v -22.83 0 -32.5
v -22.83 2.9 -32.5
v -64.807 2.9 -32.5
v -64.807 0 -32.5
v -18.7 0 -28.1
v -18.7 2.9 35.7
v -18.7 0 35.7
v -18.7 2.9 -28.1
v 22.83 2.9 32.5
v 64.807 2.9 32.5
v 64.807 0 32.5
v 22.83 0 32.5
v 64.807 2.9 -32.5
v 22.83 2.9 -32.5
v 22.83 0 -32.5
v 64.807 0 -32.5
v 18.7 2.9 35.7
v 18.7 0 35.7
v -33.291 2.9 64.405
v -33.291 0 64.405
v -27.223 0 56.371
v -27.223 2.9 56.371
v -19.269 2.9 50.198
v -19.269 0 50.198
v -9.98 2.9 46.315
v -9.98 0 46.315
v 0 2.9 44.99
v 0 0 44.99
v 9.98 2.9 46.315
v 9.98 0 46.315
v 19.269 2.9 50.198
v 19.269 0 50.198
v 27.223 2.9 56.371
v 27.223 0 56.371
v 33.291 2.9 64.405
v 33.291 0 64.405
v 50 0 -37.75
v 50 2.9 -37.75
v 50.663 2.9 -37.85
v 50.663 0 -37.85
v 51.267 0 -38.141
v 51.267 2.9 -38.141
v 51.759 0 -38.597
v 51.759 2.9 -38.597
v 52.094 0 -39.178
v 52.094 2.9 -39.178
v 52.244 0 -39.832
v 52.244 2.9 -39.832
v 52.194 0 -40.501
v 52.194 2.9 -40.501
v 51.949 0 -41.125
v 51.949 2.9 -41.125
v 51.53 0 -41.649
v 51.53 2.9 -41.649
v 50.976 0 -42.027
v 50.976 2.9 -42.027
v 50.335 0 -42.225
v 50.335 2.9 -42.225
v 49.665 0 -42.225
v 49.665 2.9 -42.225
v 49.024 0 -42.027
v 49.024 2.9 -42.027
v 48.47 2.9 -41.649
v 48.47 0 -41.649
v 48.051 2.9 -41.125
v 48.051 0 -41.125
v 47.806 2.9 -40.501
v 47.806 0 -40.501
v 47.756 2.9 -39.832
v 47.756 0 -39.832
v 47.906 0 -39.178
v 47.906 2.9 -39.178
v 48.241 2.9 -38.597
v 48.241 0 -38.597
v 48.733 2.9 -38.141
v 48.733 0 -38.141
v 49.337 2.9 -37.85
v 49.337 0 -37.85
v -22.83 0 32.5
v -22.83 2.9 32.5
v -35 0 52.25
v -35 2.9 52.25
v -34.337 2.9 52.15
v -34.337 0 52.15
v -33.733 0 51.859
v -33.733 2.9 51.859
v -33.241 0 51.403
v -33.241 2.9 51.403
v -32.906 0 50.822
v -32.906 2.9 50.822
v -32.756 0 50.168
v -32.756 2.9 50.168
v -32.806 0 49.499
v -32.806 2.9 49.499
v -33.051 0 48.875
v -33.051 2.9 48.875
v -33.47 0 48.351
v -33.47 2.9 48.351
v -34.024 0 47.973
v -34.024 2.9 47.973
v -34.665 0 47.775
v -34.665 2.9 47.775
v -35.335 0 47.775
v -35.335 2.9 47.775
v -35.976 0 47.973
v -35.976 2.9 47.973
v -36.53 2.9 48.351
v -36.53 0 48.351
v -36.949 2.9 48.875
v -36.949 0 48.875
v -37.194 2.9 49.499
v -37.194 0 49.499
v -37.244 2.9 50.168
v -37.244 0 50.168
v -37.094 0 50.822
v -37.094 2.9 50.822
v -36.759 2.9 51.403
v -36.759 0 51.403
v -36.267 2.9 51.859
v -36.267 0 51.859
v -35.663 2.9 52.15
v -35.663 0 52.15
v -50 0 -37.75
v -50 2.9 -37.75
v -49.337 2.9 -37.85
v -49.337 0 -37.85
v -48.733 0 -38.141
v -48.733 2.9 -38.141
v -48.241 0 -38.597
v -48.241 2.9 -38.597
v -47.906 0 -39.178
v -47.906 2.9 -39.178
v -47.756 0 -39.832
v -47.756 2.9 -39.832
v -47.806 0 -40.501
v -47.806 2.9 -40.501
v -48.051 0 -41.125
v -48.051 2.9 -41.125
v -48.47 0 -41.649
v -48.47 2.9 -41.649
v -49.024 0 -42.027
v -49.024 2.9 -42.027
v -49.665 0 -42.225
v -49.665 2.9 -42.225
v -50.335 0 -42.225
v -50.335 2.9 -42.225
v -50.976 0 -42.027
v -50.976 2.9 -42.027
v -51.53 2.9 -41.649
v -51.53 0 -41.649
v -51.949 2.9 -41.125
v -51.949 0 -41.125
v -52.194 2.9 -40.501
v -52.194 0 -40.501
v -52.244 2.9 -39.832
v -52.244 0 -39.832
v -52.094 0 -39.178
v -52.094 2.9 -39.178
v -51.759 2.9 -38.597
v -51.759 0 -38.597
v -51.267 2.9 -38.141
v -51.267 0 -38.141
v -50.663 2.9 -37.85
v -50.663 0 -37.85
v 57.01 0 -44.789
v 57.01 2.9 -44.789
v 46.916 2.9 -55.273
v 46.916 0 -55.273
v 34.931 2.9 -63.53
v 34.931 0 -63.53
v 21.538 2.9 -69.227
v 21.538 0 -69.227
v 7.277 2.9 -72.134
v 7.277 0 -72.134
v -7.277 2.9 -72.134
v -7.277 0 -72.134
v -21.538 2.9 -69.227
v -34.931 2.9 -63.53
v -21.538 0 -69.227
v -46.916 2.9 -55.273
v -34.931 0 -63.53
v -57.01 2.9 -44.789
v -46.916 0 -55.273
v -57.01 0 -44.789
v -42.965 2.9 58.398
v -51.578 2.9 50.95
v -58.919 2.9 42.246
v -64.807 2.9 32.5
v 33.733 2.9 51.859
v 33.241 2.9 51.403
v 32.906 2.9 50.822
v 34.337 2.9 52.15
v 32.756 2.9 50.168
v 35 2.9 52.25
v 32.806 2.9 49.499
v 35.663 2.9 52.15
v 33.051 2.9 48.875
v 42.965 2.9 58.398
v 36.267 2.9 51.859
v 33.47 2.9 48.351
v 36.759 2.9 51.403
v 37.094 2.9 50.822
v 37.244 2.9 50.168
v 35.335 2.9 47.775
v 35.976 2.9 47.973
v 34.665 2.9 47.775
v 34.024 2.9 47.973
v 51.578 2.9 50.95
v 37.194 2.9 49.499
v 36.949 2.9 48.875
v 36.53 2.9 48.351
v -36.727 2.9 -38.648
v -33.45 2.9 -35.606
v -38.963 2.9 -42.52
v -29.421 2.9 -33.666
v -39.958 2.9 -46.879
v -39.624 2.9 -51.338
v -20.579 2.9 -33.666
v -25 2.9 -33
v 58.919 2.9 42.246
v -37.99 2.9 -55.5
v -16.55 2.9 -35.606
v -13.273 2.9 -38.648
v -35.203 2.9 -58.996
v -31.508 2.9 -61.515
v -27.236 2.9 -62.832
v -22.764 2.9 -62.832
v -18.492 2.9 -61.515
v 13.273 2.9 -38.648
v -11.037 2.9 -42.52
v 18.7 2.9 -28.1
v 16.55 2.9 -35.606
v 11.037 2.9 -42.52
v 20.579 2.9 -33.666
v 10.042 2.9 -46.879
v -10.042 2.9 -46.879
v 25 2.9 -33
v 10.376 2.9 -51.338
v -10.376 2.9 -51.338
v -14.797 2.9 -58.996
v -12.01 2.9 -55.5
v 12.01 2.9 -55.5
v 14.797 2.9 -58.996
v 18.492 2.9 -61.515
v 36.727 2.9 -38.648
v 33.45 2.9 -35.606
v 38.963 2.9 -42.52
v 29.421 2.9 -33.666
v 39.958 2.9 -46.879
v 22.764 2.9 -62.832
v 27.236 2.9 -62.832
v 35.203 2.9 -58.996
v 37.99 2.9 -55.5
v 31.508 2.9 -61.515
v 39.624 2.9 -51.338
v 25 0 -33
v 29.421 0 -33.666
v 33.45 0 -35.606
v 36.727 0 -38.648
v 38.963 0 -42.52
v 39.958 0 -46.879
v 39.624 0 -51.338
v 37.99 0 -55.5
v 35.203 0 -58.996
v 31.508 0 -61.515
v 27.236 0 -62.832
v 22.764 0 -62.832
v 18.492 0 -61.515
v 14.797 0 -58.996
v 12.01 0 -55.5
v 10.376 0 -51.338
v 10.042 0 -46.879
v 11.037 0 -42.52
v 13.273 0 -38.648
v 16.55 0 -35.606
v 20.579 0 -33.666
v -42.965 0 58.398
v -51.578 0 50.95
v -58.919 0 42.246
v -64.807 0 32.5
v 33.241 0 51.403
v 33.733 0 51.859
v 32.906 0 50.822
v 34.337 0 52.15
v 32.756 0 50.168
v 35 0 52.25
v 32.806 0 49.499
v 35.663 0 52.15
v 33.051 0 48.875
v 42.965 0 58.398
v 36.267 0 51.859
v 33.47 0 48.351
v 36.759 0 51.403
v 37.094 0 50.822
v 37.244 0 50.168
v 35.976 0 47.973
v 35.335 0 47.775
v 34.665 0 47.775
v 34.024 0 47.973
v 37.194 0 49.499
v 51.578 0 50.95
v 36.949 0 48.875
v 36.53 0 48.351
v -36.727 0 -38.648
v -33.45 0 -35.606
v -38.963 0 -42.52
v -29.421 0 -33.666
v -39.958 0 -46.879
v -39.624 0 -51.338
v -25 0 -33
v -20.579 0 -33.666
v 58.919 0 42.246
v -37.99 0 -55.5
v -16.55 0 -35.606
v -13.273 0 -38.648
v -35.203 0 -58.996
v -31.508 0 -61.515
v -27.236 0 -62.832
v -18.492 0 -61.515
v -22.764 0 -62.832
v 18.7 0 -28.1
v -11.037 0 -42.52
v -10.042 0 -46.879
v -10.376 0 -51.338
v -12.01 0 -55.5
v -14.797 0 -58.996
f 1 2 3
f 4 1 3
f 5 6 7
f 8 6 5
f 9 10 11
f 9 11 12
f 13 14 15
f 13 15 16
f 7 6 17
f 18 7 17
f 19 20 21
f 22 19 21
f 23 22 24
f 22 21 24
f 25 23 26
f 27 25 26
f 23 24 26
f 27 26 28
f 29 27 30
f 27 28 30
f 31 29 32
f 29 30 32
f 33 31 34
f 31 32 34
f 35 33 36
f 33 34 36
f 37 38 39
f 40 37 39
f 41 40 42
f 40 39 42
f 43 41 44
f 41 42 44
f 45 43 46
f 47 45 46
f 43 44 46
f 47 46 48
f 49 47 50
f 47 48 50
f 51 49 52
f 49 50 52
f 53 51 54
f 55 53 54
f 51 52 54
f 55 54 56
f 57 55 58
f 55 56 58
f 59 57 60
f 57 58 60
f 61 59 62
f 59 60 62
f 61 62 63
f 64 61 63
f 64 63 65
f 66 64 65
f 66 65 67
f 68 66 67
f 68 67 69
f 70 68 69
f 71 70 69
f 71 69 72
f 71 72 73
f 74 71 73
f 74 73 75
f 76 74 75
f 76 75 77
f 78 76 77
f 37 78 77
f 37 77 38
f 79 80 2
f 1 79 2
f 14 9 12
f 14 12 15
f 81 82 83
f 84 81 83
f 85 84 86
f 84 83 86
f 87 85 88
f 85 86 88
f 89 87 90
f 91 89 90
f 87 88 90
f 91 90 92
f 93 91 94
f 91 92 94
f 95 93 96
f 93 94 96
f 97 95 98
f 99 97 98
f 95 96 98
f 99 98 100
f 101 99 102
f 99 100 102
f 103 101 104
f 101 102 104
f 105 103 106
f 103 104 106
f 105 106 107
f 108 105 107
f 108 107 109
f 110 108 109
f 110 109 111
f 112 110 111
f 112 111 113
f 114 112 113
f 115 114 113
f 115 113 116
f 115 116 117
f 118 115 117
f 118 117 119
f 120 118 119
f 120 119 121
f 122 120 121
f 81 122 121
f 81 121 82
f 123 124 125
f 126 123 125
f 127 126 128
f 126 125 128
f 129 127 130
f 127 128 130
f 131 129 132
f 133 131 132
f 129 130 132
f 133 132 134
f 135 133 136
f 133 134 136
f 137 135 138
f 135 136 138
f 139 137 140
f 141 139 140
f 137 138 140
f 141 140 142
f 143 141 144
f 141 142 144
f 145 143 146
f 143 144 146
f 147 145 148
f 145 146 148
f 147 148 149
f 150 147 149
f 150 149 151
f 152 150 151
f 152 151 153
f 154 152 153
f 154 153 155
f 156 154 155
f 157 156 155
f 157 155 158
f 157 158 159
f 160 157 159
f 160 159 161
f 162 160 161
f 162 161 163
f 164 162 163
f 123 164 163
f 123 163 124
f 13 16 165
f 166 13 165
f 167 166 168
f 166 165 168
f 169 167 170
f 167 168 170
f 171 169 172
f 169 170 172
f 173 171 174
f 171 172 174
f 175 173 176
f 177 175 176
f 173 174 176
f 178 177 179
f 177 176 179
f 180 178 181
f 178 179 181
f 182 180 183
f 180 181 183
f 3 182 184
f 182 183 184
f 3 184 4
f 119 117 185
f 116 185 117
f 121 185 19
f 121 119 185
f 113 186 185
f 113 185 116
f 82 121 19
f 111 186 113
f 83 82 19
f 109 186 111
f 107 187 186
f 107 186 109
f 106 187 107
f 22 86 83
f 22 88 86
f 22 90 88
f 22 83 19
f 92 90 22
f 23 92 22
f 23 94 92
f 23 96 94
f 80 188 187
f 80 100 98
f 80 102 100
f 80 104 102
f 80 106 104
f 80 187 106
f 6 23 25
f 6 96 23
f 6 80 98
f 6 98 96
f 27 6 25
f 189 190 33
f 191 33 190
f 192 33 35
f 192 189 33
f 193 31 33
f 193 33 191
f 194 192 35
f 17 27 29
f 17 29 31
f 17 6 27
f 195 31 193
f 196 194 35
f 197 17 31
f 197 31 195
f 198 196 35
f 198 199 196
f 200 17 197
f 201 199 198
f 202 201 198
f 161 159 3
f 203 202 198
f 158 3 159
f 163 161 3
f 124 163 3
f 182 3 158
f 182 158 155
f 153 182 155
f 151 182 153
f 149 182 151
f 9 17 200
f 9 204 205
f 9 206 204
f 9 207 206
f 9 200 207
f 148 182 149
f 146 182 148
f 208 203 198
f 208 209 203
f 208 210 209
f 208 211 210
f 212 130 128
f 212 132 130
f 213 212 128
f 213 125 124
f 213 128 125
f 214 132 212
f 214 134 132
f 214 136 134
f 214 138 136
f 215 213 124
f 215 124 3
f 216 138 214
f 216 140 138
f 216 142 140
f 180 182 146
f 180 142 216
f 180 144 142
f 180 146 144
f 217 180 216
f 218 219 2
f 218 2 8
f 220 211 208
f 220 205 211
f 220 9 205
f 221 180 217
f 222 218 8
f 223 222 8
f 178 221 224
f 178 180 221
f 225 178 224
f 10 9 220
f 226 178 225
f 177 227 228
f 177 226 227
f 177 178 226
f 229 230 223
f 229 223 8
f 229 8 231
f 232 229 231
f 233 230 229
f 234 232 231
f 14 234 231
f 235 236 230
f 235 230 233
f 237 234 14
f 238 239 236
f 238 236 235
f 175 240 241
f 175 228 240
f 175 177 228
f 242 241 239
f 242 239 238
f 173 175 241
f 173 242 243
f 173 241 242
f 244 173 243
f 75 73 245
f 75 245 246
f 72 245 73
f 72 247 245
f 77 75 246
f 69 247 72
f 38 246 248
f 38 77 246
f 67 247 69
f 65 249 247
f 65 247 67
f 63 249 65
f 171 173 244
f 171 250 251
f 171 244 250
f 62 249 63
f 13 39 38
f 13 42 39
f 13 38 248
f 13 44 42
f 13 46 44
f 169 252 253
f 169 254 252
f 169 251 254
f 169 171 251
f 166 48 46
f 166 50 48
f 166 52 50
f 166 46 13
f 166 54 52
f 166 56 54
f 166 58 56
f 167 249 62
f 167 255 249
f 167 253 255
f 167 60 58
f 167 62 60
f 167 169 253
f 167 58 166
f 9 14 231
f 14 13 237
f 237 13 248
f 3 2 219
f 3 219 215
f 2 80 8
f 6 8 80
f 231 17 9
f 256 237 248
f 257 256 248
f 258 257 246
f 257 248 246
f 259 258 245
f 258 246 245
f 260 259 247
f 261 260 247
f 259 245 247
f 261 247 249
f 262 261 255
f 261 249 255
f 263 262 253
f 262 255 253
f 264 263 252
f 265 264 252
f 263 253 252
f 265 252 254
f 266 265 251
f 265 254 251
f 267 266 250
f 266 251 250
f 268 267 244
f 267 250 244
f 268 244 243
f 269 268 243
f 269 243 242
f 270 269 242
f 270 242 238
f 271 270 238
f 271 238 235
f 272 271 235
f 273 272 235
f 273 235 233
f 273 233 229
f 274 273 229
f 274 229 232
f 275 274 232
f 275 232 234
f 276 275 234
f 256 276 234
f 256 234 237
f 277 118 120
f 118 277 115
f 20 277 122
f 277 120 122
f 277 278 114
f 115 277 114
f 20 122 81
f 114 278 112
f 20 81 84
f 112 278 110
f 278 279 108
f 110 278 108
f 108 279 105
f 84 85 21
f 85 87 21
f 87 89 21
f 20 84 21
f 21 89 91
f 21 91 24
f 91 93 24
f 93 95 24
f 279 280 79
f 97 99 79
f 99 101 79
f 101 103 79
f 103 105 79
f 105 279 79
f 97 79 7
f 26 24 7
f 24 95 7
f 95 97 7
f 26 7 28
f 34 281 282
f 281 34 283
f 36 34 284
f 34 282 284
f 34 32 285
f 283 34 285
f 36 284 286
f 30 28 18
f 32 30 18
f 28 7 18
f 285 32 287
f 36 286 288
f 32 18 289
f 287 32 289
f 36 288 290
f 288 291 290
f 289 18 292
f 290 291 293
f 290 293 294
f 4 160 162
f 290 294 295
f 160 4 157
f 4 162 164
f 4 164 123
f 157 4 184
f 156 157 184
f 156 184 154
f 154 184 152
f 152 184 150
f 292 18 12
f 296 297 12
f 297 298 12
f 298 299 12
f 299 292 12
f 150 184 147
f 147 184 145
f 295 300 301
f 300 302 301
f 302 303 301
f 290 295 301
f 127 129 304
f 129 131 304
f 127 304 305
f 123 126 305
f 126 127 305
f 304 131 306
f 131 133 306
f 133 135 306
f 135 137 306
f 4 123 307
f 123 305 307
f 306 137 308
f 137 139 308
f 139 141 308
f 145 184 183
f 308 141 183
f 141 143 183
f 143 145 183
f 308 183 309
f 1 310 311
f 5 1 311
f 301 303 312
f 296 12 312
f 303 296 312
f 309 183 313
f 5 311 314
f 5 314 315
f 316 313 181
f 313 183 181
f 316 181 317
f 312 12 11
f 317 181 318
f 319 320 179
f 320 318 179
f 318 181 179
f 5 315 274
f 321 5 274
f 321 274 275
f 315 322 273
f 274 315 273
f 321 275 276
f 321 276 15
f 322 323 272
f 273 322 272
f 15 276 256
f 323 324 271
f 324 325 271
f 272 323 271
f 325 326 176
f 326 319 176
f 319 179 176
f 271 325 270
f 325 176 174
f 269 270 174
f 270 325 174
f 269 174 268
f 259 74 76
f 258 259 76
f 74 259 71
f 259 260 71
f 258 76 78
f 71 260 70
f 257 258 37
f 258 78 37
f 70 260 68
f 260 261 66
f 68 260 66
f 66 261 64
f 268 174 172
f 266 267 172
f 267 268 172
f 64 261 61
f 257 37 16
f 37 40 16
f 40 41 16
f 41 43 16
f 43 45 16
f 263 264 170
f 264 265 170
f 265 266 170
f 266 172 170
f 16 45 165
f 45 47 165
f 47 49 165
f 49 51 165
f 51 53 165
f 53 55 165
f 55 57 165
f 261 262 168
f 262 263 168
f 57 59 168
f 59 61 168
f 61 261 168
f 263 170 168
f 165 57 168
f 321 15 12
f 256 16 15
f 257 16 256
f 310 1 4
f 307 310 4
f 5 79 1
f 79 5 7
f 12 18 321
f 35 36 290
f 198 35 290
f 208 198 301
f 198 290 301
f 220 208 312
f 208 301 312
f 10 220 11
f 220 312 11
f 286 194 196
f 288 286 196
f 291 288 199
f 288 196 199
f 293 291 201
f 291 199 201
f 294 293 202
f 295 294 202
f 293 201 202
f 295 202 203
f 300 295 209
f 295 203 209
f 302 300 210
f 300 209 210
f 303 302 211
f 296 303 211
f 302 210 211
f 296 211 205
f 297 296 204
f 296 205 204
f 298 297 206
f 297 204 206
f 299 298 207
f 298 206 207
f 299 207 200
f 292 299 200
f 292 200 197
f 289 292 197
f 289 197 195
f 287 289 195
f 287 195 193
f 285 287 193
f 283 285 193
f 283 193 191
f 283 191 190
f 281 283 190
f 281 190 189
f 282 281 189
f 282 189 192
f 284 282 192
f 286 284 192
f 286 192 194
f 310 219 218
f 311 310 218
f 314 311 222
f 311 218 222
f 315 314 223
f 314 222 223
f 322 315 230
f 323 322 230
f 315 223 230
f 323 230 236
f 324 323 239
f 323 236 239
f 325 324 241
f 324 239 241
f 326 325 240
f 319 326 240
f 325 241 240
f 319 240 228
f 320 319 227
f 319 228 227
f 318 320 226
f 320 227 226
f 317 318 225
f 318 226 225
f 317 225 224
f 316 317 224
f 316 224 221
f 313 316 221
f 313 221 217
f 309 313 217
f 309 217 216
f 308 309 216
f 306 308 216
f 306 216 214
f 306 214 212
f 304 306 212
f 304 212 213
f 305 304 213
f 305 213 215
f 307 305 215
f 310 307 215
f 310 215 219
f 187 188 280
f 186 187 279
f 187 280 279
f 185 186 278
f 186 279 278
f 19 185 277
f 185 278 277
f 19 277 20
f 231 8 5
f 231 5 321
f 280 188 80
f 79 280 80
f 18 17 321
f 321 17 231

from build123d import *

# Parameters (mm, degrees)
BOSS_EXTRUDE1_DEPTH  = 2.9
SOLENOID_PLACEMENT_W = 37.4
SOLENOID_PLACEMENT_H = 63.8
CUT_EXTRUDE1_DEPTH   = 103.571487266
CUT_EXTRUDE3_DEPTH   = 103.571487266
SKETCH7_R            = 15
CUT_EXTRUDE6_DEPTH   = 98.286484159
SKETCH8_R            = 2.25
CUT_EXTRUDE7_DEPTH   = 98.286484159


with BuildPart() as part:
    # Sketch1 → Boss-Extrude1 (new body)
    with BuildSketch(Plane(origin=(0, 0, 0), x_dir=(1, 0, 0), z_dir=(0, 1, 0))):
        with BuildLine():
            ThreePointArc((33.29110537, -64.404598464), (0, 72.5), (-33.29110537, -64.404598464))
            ThreePointArc((-33.29110537, -64.404598464), (0, -44.989799638), (33.29110537, -64.404598464))
        make_face()
    extrude(amount=BOSS_EXTRUDE1_DEPTH)

    # solenoid placement → Cut-Extrude1 (cut, through all)
    with BuildSketch(Plane(origin=(0, 2.9, 0), x_dir=(1, 0, 0), z_dir=(0, 1, 0))):
        with Locations((0, -3.8)):
            Rectangle(SOLENOID_PLACEMENT_W, SOLENOID_PLACEMENT_H)
    extrude(amount=-CUT_EXTRUDE1_DEPTH, mode=Mode.SUBTRACT)

    # Sketch3 → Cut-Extrude3 (cut, through all)
    with BuildSketch(Plane(origin=(0, 2.9, 0), x_dir=(1, 0, 0), z_dir=(0, 1, 0))):
        with BuildLine():
            Line((-34.63, -32.5), (-22.83, -32.5))
            Line((-22.83, -32.5), (-22.83, 32.5))
            Line((-22.83, 32.5), (-64.807406984, 32.5))
            ThreePointArc((-64.807406984, 32.5), (-72.5, 0), (-64.807406984, -32.5))
            Line((-64.807406984, -32.5), (-34.63, -32.5))
        make_face()
        with BuildLine():
            Line((22.83, -32.5), (22.83, 32.5))
            Line((22.83, 32.5), (64.807406984, 32.5))
            ThreePointArc((64.807406984, 32.5), (72.5, 0), (64.807406984, -32.5))
            Line((64.807406984, -32.5), (34.63, -32.5))
            Line((34.63, -32.5), (22.83, -32.5))
        make_face()
    extrude(amount=-CUT_EXTRUDE3_DEPTH, mode=Mode.SUBTRACT)

    # Sketch7 → Cut-Extrude6 (cut, through all)
    with BuildSketch(Plane(origin=(0, 2.9, 0), x_dir=(1, 0, 0), z_dir=(0, 1, 0))):
        with Locations(Location((25, 48, 0), (0, 0, 270))):
            Circle(SKETCH7_R)
        with Locations(Location((-25, 48, 0), (0, 0, 270))):
            Circle(SKETCH7_R)
    extrude(amount=-CUT_EXTRUDE6_DEPTH, mode=Mode.SUBTRACT)

    # Sketch8 → Cut-Extrude7 (cut, through all)
    with BuildSketch(Plane(origin=(0, 2.9, 0), x_dir=(1, 0, 0), z_dir=(0, 1, 0))):
        with Locations(Location((35, -50, 0), (0, 0, 270))):
            Circle(SKETCH8_R)
        with Locations(Location((-35, -50, 0), (0, 0, 270))):
            Circle(SKETCH8_R)
        with Locations(Location((-50, 40, 0), (0, 0, 270))):
            Circle(SKETCH8_R)
        with Locations(Location((50, 40, 0), (0, 0, 270))):
            Circle(SKETCH8_R)
    extrude(amount=-CUT_EXTRUDE7_DEPTH, mode=Mode.SUBTRACT)


solid = part.part
